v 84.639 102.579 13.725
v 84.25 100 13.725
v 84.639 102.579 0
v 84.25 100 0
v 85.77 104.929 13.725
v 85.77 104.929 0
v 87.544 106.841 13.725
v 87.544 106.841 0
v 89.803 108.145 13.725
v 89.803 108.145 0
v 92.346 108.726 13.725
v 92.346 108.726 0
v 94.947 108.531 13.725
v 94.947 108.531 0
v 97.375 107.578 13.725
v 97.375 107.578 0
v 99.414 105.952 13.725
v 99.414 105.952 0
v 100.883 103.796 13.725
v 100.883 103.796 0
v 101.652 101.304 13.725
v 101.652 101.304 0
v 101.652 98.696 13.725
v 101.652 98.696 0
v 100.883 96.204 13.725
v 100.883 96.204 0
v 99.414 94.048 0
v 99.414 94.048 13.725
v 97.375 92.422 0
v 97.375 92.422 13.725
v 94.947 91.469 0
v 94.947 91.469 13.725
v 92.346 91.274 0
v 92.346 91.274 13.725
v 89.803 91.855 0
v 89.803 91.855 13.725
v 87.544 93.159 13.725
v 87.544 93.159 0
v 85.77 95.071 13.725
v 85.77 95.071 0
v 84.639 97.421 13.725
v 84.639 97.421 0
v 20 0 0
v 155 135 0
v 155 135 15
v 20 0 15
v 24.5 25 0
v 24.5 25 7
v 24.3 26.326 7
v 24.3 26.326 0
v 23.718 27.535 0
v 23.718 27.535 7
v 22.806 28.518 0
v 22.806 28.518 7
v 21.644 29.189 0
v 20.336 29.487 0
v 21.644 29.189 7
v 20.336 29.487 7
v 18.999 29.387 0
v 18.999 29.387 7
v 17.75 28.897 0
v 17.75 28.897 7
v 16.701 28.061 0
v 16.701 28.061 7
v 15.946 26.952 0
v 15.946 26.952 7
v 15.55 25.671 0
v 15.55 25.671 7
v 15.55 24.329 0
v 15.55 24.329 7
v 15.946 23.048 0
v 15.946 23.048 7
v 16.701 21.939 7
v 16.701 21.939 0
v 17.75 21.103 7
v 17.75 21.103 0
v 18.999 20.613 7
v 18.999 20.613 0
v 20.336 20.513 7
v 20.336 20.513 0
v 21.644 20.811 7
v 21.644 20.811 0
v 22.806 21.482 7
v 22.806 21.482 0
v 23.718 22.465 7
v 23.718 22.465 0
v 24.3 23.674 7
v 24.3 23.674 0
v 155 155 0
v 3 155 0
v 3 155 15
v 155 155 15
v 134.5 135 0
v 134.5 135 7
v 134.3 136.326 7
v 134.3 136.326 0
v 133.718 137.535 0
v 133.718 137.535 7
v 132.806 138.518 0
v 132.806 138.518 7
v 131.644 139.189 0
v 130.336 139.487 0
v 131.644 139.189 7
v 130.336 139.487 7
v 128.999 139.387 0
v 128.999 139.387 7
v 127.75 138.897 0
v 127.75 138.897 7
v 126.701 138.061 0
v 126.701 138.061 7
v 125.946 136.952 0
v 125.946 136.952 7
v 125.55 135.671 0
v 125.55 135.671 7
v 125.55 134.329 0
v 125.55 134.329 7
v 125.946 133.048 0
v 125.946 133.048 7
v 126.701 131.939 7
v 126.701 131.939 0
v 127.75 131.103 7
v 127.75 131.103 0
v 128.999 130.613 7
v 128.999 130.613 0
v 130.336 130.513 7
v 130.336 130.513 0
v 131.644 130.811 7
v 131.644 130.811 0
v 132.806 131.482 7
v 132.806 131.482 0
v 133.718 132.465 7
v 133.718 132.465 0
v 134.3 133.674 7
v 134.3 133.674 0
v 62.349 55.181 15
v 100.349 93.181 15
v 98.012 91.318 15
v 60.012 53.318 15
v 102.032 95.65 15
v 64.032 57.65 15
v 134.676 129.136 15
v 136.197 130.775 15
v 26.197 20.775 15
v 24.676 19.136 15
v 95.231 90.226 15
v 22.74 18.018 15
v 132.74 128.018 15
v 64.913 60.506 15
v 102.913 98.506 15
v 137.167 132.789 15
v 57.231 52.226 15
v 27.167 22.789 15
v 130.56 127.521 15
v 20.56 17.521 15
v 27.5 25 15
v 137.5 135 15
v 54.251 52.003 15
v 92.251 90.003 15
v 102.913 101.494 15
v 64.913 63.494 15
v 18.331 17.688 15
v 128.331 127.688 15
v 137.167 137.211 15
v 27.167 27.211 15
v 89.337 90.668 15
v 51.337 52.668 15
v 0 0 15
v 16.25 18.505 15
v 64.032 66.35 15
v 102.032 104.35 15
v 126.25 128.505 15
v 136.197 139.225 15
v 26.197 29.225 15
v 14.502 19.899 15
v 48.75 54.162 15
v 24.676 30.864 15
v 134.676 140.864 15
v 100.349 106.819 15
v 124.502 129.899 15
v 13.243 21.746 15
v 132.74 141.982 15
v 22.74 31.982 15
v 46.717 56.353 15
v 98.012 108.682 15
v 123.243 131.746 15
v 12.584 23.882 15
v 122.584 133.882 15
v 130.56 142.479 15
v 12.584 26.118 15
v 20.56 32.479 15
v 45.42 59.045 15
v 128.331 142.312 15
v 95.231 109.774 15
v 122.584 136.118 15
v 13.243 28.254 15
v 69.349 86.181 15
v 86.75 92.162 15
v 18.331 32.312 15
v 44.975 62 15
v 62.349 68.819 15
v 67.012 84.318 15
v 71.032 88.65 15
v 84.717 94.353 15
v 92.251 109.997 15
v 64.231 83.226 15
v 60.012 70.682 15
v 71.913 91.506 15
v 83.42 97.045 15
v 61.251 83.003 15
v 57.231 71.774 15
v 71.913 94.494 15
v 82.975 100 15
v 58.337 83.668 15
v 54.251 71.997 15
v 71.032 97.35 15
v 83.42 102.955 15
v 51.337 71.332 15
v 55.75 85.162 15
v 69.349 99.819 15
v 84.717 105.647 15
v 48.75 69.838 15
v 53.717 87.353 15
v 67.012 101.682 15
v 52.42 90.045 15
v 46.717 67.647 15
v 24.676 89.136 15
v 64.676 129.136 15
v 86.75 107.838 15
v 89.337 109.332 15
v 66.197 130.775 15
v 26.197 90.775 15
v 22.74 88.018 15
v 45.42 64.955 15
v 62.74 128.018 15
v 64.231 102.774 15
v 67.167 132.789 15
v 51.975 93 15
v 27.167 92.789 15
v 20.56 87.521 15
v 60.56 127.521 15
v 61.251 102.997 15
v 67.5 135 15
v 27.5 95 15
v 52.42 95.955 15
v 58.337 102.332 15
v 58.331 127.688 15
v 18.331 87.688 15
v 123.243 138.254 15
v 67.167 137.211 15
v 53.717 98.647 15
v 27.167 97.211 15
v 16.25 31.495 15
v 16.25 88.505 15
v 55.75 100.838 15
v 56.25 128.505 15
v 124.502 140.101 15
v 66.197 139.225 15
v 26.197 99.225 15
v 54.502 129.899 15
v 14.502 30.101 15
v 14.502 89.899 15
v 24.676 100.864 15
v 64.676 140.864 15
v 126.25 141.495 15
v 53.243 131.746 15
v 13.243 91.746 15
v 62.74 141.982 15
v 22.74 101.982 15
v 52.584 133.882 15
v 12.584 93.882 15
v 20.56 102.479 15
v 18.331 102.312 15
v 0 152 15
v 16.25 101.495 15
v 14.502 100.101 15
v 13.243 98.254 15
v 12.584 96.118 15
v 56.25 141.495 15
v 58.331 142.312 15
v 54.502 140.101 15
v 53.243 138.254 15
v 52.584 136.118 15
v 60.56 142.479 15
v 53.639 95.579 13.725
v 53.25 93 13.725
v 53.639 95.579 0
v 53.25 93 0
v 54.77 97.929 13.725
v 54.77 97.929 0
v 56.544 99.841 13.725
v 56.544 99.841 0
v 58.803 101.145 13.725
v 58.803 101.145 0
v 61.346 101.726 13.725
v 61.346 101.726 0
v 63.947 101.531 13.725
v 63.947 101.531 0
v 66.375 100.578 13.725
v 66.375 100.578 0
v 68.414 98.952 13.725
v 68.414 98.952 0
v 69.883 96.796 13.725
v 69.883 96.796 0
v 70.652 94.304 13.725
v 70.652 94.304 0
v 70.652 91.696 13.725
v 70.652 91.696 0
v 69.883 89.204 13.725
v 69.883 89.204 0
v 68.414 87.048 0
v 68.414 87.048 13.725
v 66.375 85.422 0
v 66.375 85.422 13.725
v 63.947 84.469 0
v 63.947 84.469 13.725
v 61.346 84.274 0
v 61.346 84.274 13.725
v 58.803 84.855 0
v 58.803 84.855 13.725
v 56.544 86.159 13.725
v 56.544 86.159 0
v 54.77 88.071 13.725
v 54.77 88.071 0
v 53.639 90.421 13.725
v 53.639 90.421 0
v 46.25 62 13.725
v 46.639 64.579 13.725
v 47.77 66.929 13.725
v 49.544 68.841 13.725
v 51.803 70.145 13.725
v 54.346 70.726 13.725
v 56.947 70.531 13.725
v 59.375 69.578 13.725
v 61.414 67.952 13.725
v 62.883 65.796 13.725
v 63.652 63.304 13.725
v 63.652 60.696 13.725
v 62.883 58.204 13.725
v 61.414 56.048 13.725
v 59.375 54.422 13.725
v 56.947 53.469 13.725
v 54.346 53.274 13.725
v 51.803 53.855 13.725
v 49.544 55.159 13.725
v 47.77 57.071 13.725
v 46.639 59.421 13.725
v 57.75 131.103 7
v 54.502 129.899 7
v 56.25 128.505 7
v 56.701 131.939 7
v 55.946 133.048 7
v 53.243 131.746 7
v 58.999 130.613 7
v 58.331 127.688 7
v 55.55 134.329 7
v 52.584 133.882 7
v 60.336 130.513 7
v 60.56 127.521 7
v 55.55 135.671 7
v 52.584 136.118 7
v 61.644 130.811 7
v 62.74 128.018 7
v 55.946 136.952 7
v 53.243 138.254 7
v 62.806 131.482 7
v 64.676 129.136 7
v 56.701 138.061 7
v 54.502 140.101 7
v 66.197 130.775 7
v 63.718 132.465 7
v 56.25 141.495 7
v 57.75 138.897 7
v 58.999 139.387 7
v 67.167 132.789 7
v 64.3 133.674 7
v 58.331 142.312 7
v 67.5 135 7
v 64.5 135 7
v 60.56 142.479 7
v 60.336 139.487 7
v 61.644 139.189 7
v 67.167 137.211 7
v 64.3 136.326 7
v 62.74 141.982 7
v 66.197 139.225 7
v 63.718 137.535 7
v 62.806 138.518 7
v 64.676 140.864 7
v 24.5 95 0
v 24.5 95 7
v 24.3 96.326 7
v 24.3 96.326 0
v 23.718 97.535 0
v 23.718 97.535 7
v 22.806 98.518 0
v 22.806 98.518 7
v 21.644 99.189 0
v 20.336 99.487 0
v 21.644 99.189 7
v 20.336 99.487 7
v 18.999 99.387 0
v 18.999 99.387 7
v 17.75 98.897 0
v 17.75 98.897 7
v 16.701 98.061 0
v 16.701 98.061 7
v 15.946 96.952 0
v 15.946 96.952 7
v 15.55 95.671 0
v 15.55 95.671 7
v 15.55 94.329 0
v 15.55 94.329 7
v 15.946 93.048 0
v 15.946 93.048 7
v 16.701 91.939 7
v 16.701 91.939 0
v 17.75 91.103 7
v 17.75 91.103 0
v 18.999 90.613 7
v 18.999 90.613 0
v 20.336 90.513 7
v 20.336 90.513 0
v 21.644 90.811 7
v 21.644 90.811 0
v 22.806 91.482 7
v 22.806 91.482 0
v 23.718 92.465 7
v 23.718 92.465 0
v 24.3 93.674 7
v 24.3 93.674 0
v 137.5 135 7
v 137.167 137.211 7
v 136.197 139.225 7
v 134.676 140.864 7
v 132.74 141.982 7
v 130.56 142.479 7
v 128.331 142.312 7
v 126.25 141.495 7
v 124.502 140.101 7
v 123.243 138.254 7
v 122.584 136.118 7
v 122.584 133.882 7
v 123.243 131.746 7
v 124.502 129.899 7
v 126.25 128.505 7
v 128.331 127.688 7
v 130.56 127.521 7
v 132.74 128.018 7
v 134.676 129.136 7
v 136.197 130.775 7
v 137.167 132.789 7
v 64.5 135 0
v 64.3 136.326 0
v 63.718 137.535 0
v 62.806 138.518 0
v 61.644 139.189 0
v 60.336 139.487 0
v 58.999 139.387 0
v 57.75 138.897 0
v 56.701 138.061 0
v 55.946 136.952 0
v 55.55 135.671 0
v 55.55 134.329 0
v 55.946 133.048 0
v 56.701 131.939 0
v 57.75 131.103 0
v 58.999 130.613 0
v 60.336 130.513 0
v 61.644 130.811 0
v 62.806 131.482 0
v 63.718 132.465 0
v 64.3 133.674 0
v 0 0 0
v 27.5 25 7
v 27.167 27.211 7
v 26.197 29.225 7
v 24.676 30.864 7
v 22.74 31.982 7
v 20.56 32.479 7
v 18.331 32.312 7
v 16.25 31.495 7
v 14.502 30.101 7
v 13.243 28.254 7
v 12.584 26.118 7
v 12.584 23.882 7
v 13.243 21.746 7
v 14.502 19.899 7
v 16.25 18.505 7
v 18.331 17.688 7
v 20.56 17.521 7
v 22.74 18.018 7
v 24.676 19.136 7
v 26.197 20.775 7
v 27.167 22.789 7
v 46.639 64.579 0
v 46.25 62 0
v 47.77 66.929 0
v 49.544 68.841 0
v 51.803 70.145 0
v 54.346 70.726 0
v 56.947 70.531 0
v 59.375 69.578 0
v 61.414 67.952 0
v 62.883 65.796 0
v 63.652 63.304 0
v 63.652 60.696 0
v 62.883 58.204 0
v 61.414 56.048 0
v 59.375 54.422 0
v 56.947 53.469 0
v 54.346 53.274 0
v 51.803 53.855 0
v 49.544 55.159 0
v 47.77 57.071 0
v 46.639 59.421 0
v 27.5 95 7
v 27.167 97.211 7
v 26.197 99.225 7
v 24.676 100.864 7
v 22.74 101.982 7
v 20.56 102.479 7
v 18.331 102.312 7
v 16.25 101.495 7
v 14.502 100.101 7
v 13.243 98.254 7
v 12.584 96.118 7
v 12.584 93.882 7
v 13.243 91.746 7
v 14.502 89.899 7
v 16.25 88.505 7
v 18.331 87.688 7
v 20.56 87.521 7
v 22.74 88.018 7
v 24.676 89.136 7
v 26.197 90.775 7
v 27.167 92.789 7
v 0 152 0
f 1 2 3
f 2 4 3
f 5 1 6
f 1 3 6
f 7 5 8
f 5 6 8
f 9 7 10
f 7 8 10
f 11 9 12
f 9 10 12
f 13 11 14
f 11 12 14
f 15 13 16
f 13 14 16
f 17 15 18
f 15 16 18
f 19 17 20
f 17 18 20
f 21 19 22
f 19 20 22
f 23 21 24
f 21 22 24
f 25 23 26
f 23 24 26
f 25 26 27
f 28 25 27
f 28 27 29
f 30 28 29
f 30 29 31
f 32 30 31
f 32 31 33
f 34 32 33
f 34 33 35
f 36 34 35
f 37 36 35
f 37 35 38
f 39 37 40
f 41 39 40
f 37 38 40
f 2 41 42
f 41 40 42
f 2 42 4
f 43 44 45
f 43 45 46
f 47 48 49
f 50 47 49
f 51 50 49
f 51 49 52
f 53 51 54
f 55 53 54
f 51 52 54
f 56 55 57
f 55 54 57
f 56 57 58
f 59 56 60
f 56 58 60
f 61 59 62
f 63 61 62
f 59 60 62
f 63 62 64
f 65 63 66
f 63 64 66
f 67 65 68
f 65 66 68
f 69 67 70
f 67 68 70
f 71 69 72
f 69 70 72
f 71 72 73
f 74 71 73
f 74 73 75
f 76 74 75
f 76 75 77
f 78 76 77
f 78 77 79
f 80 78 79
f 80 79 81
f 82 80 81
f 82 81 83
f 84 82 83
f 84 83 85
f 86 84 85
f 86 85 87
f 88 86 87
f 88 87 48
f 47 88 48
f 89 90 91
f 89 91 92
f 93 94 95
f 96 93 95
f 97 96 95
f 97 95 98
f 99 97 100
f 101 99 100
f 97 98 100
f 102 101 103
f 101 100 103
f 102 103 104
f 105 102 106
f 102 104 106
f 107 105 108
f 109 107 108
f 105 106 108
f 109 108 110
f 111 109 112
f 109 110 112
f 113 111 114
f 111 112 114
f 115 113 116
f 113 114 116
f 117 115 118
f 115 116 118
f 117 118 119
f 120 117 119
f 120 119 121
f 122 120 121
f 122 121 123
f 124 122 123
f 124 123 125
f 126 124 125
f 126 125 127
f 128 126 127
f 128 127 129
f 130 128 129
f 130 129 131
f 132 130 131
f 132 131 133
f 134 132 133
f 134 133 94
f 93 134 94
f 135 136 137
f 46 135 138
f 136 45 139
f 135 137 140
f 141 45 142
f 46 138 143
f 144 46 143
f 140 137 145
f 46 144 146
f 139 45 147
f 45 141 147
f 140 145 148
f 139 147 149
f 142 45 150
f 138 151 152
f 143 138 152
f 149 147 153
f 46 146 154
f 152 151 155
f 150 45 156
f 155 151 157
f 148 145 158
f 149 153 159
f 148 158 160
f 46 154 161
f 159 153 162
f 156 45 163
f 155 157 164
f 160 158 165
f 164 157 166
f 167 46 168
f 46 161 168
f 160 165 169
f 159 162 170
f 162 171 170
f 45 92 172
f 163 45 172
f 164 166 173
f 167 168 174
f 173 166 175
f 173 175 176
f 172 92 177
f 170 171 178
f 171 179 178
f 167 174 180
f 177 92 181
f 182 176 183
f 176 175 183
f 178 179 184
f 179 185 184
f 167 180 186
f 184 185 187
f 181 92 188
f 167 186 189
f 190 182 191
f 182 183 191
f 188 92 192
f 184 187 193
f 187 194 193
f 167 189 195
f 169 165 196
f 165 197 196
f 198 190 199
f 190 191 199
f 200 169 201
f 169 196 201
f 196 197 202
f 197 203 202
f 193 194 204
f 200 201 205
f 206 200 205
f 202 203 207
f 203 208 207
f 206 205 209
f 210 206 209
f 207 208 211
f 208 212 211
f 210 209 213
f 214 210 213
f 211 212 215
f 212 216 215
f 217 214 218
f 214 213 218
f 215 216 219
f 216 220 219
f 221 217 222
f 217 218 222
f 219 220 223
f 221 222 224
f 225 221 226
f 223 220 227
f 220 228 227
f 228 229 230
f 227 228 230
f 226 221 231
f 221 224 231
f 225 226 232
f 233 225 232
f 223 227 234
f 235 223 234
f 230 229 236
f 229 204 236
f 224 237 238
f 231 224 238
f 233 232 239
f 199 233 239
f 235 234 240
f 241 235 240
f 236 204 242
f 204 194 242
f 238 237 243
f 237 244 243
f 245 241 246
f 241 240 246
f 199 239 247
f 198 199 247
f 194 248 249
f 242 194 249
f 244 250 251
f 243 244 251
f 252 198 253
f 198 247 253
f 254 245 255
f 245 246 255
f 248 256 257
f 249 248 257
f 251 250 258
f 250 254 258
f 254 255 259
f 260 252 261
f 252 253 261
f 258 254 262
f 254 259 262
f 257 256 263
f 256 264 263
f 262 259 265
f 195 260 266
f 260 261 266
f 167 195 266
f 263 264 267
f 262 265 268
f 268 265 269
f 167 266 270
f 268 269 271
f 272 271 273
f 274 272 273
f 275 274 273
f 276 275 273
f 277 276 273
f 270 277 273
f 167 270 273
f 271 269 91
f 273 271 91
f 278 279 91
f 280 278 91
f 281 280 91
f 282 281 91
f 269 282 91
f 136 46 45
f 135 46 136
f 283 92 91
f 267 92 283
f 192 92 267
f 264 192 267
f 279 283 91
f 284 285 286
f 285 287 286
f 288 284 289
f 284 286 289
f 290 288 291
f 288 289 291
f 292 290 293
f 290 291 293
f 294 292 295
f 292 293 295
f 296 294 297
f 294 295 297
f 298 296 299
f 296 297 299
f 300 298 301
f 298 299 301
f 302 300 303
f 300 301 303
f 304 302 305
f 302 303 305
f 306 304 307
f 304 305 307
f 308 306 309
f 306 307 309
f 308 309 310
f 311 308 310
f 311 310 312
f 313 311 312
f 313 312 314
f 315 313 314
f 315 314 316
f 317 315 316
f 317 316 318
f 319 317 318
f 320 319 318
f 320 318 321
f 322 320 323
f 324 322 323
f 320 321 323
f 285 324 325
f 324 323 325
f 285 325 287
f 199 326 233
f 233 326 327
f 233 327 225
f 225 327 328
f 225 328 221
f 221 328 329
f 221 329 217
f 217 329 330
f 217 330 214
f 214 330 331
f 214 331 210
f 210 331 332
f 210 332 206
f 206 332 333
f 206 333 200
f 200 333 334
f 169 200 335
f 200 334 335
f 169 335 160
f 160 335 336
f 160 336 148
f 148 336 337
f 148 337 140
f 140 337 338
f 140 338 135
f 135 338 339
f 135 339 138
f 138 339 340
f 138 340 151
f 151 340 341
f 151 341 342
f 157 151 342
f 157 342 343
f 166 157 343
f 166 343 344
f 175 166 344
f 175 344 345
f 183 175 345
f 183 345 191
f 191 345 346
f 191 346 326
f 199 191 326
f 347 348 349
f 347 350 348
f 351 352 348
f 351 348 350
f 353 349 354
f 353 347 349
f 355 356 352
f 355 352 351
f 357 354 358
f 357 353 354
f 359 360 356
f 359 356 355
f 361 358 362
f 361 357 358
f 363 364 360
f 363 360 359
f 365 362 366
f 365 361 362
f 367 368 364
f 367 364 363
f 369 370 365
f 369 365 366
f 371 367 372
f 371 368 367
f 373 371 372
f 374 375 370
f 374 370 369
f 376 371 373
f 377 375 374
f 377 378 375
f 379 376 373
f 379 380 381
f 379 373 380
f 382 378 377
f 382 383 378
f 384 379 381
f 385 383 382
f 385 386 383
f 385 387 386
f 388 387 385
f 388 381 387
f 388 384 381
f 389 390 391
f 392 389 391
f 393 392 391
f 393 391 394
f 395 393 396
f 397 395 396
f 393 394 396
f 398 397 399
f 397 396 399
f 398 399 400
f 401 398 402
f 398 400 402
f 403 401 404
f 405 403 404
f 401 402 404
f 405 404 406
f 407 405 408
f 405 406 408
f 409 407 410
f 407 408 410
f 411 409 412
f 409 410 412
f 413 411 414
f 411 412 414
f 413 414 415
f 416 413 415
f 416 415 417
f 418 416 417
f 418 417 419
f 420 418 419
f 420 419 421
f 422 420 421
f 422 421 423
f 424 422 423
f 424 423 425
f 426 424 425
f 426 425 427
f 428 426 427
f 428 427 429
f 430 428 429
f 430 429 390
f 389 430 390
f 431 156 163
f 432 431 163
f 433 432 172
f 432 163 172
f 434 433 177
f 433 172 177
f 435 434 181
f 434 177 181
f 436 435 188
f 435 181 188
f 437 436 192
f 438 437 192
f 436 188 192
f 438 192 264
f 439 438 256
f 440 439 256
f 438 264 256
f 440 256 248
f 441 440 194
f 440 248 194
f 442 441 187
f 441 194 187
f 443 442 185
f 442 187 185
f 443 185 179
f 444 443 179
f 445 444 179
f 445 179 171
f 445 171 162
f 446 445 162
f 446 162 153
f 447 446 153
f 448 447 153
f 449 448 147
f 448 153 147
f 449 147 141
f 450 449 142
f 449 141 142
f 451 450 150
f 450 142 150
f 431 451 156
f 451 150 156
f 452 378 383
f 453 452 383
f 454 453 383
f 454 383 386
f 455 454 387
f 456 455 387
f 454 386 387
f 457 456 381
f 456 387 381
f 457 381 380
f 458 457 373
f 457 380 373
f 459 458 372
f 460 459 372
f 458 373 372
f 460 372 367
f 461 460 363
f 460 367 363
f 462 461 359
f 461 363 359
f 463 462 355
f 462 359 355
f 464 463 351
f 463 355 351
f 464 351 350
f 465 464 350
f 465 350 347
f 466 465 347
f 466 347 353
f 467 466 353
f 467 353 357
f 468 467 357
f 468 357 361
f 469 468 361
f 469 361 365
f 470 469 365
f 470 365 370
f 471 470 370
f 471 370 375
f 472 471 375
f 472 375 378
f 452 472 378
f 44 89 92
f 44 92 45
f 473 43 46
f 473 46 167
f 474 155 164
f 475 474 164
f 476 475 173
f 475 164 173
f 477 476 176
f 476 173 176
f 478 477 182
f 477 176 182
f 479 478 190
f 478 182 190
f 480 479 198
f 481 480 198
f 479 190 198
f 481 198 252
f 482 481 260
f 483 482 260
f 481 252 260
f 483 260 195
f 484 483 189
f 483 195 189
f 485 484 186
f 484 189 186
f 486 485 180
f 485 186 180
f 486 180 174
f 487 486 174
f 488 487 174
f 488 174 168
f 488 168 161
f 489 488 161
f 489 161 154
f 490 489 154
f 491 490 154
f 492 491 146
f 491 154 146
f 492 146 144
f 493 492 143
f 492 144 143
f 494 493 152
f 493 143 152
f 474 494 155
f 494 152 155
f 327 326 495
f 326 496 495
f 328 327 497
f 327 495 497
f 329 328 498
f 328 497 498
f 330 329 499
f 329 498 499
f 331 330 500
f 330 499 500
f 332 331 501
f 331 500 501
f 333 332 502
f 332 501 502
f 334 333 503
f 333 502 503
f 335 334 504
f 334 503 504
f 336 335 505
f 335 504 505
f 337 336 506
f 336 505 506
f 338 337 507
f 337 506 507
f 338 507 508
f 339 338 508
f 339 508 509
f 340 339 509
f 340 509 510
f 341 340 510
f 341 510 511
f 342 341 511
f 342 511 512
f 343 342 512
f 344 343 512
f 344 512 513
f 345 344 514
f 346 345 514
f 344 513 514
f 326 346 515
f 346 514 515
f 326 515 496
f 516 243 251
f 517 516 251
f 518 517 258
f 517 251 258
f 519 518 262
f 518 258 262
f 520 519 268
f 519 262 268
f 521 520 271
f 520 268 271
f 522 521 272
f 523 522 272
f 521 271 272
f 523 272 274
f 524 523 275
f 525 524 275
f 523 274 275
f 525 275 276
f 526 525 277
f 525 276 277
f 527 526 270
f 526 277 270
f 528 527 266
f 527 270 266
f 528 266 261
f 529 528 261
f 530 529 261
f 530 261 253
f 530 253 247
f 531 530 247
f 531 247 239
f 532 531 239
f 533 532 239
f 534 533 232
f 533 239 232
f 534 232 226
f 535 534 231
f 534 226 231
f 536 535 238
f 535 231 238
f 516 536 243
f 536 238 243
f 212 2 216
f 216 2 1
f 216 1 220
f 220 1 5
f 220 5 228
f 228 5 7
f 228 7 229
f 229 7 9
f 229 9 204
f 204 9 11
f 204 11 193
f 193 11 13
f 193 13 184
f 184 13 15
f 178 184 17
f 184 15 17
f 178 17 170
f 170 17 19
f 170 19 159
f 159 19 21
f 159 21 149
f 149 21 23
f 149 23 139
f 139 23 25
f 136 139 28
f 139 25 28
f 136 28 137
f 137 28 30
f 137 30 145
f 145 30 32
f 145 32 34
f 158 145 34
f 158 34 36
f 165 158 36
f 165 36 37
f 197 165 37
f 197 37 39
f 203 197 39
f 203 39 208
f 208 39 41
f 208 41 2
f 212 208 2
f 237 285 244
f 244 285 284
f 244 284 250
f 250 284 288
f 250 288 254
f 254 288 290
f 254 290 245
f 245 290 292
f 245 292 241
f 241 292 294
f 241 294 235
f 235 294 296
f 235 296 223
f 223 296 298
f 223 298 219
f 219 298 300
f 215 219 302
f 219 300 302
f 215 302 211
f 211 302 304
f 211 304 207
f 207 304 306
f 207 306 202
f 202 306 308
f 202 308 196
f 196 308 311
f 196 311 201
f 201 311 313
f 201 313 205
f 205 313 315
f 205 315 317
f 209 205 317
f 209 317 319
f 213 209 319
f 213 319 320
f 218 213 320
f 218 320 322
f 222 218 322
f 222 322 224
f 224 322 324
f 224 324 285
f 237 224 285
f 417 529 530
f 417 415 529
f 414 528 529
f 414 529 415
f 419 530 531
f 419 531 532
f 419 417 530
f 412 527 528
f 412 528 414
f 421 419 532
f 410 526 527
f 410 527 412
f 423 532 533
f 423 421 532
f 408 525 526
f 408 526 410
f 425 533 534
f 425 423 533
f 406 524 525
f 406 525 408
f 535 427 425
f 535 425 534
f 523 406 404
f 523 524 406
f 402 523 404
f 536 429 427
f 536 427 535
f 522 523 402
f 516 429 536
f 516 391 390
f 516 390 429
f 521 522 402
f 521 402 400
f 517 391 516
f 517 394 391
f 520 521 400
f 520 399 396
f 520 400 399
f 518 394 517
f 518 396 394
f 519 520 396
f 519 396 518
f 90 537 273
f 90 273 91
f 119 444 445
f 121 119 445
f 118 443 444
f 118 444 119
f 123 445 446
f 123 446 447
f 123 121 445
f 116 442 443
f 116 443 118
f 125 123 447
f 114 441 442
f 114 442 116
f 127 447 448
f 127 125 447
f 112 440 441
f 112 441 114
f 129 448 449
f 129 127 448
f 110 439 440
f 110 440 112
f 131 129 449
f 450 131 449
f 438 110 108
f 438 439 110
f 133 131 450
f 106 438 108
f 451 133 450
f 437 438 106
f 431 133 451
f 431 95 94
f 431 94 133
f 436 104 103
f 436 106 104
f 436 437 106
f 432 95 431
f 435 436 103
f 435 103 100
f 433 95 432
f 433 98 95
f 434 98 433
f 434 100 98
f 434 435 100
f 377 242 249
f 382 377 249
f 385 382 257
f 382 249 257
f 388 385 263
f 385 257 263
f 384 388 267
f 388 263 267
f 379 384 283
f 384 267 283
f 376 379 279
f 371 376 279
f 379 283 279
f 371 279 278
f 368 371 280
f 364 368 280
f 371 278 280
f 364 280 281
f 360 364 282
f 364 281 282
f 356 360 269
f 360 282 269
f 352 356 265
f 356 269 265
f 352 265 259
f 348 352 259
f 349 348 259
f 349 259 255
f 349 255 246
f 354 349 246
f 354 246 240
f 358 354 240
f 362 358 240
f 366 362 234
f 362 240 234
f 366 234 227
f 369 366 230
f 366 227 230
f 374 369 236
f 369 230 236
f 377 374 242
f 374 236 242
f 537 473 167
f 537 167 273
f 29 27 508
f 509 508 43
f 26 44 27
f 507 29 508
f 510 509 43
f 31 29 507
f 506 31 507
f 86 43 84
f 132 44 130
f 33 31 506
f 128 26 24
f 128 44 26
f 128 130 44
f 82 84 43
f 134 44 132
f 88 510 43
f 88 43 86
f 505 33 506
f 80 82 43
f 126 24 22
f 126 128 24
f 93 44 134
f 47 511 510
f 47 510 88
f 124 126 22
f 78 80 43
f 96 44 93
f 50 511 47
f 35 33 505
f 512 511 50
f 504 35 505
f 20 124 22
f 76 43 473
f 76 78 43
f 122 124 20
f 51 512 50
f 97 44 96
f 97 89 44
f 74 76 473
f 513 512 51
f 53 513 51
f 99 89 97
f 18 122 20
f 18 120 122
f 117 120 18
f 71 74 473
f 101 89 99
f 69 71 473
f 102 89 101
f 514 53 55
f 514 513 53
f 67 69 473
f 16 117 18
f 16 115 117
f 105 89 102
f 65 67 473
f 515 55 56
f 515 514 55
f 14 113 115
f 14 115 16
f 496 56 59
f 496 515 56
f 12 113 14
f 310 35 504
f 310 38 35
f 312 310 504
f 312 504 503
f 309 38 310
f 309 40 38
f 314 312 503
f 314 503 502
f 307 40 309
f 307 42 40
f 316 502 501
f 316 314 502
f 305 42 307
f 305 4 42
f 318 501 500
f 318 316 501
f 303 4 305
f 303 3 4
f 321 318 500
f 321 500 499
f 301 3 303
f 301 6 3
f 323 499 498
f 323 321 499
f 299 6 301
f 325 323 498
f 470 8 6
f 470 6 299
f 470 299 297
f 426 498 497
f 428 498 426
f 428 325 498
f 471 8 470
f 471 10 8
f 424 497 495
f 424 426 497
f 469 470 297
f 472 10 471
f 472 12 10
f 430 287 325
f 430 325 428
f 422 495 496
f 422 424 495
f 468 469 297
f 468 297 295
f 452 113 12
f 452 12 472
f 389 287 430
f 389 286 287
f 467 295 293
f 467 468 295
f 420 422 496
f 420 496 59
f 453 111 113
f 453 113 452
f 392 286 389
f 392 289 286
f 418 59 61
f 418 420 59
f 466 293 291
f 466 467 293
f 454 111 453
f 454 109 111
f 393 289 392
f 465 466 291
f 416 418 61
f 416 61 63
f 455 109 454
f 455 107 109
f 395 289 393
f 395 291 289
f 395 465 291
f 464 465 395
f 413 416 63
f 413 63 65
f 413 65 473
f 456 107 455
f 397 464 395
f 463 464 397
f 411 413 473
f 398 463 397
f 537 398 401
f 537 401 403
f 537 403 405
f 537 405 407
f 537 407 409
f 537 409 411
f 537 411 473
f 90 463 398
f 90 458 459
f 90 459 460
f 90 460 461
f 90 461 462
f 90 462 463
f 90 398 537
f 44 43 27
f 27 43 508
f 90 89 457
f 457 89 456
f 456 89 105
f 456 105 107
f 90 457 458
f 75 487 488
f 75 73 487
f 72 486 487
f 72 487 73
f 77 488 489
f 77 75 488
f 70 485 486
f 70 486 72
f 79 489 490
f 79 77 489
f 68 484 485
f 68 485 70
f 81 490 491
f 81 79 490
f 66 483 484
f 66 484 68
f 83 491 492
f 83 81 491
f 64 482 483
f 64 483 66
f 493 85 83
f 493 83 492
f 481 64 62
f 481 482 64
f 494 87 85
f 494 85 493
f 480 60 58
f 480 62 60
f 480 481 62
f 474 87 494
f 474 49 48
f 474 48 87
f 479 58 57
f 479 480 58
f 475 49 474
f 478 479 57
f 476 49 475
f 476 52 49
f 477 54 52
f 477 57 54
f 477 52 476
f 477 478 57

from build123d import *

# Parameters (mm, degrees)
EXTRUDE_1_DEPTH               = 15
HOLE_WIZARD_M20_1_D           = 17.5
HOLE_WIZARD_M20_1_CSINK_D     = 20.05
HOLE_WIZARD_M20_1_CSINK_ANGLE = 90
SKETCH_5_R                    = 4.5
CUT_EXTRUDE_1_DEPTH           = 220.715725427
SKETCH_6_R                    = 7.5
CUT_EXTRUDE_2_DEPTH           = 8


with BuildPart() as part:
    # 스케치1 → 보스-돌출1 (new body)
    with BuildSketch(Plane.XY):
        Polygon((155, 135), (20, 0), (0, 0), (0, 152), (3, 155), (155, 155), align=None)
    extrude(amount=EXTRUDE_1_DEPTH)

    # M20 나사 구멍1 (through all)
    with Locations(Plane.XY.offset(15)):
        with Locations((62, 93), (55, 62), (93, 100)):
            CounterSinkHole(HOLE_WIZARD_M20_1_D / 2, HOLE_WIZARD_M20_1_CSINK_D / 2, counter_sink_angle=HOLE_WIZARD_M20_1_CSINK_ANGLE)

    # 스케치5 → 컷-돌출1 (cut, through all)
    with BuildSketch(Plane.XY.offset(15)):
        with Locations((60, 135)):
            Circle(SKETCH_5_R)
        with Locations((20, 95)):
            Circle(SKETCH_5_R)
        with Locations((130, 135)):
            Circle(SKETCH_5_R)
        with Locations((20, 25)):
            Circle(SKETCH_5_R)
    extrude(amount=-CUT_EXTRUDE_1_DEPTH, mode=Mode.SUBTRACT)

    # 스케치6 → 컷-돌출2 (cut)
    with BuildSketch(Plane.XY.offset(15)):
        with Locations((20, 95)):
            Circle(SKETCH_6_R)
        with Locations((20, 25)):
            Circle(SKETCH_6_R)
        with Locations((60, 135)):
            Circle(SKETCH_6_R)
        with Locations((130, 135)):
            Circle(SKETCH_6_R)
    extrude(amount=-CUT_EXTRUDE_2_DEPTH, mode=Mode.SUBTRACT)


solid = part.part
